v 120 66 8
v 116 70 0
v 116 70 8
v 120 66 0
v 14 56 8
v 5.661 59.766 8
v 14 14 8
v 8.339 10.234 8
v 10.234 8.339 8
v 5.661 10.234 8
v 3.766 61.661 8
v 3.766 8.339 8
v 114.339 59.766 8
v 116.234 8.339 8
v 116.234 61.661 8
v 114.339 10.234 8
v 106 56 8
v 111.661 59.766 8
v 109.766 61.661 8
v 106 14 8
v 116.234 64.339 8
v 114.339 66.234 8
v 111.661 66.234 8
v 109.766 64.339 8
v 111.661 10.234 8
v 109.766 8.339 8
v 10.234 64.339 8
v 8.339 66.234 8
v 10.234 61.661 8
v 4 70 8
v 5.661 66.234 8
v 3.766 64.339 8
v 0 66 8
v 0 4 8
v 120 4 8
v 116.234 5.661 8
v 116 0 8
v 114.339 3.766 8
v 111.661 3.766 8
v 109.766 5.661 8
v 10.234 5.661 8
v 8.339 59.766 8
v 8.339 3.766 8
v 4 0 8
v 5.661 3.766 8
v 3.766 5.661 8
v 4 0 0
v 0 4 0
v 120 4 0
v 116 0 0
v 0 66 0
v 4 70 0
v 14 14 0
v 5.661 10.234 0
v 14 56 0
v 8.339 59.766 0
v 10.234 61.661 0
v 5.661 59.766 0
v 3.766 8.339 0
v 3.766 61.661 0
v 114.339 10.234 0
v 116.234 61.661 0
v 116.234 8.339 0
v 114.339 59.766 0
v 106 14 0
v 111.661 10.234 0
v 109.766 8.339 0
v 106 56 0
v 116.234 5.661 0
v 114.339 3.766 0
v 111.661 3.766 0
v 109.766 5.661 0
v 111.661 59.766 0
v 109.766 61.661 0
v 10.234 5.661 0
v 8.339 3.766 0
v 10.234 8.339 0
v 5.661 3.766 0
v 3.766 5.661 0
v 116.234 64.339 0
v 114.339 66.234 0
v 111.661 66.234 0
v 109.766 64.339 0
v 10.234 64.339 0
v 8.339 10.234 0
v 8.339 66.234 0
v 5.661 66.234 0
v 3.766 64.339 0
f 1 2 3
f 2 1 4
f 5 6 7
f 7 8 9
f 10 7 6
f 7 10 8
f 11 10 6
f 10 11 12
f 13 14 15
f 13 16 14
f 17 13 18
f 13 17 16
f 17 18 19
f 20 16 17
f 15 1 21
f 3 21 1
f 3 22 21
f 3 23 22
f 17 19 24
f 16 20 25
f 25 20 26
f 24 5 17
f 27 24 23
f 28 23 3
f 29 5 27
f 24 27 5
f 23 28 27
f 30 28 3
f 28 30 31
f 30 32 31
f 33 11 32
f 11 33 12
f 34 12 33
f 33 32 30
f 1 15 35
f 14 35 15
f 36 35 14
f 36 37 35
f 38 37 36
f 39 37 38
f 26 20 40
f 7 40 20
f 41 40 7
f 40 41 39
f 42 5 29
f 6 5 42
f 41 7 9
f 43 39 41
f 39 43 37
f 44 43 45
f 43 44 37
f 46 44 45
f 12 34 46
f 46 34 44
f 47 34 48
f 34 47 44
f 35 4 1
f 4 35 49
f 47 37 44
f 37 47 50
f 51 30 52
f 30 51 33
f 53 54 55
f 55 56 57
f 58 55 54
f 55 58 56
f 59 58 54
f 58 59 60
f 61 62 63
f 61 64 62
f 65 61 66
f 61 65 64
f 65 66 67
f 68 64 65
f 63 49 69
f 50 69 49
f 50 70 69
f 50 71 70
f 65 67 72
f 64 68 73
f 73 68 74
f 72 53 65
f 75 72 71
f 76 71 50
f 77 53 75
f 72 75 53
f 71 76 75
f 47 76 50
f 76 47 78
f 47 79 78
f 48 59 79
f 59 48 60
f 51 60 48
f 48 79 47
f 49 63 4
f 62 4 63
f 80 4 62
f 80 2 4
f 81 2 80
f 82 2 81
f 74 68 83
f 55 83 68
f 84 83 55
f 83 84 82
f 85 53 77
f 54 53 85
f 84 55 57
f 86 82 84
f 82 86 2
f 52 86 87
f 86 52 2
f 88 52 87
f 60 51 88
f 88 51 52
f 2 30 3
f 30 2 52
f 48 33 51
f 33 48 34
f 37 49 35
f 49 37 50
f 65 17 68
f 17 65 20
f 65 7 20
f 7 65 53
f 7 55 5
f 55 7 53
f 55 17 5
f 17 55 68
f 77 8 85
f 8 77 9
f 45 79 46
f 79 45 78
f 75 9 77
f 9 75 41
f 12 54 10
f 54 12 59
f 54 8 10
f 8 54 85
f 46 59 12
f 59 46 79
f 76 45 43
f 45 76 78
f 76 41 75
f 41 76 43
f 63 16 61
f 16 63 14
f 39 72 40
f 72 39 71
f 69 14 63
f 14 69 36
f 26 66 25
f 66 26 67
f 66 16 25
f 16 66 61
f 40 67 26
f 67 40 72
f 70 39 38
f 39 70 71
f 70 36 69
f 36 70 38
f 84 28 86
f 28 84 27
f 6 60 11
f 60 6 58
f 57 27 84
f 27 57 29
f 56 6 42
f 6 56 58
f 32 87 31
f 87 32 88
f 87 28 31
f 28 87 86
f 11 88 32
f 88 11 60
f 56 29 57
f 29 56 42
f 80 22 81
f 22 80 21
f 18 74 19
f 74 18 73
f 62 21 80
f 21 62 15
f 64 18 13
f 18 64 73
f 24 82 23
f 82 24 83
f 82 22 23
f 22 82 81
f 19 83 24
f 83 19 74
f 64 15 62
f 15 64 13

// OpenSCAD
$fn = 32;

// ----------------------------------------------------------------------
// Frame plate: 120 x 70 frame, 14 mm rails
// ----------------------------------------------------------------------

// --- parameters (mm) ---
plate_l = 120;            // plate length, X
plate_w = 70;             // plate width, Y
plate_t = 8;              // plate thickness, Z (extrusion height)
corner_c = 4;             // corner chamfer
frame_bar = 14;           // frame rail width
bolt_r = 3.5;             // corner bolt window radius
bolt_inset = 7;           // bolt centre inset from the edges

win_l = plate_l - 2 * frame_bar;  // window length
win_w = plate_w - 2 * frame_bar;  // window width
bolt_d = 2 * bolt_r;  // corner hole diameter

profile = [[4, 0], [116, 0], [120, 4], [120, 66], [116, 70], [4, 70], [0, 66], [0, 4]];  // primary outline, 8 points, counter clockwise
void_1 = [[14, 14], [106, 14], [106, 56], [14, 56]];  // the window, 4 points
void_2 = [[10.234, 8.339], [8.339, 10.234], [5.661, 10.234], [3.766, 8.339], [3.766, 5.661], [5.661, 3.766], [8.339, 3.766], [10.234, 5.661]];  // corner bolt window, 8 points
void_3 = [[116.234, 8.339], [114.339, 10.234], [111.661, 10.234], [109.766, 8.339], [109.766, 5.661], [111.661, 3.766], [114.339, 3.766], [116.234, 5.661]];  // corner bolt window, 8 points
void_4 = [[10.234, 64.339], [8.339, 66.234], [5.661, 66.234], [3.766, 64.339], [3.766, 61.661], [5.661, 59.766], [8.339, 59.766], [10.234, 61.661]];  // corner bolt window, 8 points
void_5 = [[116.234, 64.339], [114.339, 66.234], [111.661, 66.234], [109.766, 64.339], [109.766, 61.661], [111.661, 59.766], [114.339, 59.766], [116.234, 61.661]];  // corner bolt window, 8 points

// --- the one profile operation ---
difference() {
  linear_extrude(height = plate_t) polygon(points = profile);
  translate([0, 0, -1])
    linear_extrude(height = plate_t + 2) polygon(points = void_1);
  translate([0, 0, -1])
    linear_extrude(height = plate_t + 2) polygon(points = void_2);
  translate([0, 0, -1])
    linear_extrude(height = plate_t + 2) polygon(points = void_3);
  translate([0, 0, -1])
    linear_extrude(height = plate_t + 2) polygon(points = void_4);
  translate([0, 0, -1])
    linear_extrude(height = plate_t + 2) polygon(points = void_5);
}
